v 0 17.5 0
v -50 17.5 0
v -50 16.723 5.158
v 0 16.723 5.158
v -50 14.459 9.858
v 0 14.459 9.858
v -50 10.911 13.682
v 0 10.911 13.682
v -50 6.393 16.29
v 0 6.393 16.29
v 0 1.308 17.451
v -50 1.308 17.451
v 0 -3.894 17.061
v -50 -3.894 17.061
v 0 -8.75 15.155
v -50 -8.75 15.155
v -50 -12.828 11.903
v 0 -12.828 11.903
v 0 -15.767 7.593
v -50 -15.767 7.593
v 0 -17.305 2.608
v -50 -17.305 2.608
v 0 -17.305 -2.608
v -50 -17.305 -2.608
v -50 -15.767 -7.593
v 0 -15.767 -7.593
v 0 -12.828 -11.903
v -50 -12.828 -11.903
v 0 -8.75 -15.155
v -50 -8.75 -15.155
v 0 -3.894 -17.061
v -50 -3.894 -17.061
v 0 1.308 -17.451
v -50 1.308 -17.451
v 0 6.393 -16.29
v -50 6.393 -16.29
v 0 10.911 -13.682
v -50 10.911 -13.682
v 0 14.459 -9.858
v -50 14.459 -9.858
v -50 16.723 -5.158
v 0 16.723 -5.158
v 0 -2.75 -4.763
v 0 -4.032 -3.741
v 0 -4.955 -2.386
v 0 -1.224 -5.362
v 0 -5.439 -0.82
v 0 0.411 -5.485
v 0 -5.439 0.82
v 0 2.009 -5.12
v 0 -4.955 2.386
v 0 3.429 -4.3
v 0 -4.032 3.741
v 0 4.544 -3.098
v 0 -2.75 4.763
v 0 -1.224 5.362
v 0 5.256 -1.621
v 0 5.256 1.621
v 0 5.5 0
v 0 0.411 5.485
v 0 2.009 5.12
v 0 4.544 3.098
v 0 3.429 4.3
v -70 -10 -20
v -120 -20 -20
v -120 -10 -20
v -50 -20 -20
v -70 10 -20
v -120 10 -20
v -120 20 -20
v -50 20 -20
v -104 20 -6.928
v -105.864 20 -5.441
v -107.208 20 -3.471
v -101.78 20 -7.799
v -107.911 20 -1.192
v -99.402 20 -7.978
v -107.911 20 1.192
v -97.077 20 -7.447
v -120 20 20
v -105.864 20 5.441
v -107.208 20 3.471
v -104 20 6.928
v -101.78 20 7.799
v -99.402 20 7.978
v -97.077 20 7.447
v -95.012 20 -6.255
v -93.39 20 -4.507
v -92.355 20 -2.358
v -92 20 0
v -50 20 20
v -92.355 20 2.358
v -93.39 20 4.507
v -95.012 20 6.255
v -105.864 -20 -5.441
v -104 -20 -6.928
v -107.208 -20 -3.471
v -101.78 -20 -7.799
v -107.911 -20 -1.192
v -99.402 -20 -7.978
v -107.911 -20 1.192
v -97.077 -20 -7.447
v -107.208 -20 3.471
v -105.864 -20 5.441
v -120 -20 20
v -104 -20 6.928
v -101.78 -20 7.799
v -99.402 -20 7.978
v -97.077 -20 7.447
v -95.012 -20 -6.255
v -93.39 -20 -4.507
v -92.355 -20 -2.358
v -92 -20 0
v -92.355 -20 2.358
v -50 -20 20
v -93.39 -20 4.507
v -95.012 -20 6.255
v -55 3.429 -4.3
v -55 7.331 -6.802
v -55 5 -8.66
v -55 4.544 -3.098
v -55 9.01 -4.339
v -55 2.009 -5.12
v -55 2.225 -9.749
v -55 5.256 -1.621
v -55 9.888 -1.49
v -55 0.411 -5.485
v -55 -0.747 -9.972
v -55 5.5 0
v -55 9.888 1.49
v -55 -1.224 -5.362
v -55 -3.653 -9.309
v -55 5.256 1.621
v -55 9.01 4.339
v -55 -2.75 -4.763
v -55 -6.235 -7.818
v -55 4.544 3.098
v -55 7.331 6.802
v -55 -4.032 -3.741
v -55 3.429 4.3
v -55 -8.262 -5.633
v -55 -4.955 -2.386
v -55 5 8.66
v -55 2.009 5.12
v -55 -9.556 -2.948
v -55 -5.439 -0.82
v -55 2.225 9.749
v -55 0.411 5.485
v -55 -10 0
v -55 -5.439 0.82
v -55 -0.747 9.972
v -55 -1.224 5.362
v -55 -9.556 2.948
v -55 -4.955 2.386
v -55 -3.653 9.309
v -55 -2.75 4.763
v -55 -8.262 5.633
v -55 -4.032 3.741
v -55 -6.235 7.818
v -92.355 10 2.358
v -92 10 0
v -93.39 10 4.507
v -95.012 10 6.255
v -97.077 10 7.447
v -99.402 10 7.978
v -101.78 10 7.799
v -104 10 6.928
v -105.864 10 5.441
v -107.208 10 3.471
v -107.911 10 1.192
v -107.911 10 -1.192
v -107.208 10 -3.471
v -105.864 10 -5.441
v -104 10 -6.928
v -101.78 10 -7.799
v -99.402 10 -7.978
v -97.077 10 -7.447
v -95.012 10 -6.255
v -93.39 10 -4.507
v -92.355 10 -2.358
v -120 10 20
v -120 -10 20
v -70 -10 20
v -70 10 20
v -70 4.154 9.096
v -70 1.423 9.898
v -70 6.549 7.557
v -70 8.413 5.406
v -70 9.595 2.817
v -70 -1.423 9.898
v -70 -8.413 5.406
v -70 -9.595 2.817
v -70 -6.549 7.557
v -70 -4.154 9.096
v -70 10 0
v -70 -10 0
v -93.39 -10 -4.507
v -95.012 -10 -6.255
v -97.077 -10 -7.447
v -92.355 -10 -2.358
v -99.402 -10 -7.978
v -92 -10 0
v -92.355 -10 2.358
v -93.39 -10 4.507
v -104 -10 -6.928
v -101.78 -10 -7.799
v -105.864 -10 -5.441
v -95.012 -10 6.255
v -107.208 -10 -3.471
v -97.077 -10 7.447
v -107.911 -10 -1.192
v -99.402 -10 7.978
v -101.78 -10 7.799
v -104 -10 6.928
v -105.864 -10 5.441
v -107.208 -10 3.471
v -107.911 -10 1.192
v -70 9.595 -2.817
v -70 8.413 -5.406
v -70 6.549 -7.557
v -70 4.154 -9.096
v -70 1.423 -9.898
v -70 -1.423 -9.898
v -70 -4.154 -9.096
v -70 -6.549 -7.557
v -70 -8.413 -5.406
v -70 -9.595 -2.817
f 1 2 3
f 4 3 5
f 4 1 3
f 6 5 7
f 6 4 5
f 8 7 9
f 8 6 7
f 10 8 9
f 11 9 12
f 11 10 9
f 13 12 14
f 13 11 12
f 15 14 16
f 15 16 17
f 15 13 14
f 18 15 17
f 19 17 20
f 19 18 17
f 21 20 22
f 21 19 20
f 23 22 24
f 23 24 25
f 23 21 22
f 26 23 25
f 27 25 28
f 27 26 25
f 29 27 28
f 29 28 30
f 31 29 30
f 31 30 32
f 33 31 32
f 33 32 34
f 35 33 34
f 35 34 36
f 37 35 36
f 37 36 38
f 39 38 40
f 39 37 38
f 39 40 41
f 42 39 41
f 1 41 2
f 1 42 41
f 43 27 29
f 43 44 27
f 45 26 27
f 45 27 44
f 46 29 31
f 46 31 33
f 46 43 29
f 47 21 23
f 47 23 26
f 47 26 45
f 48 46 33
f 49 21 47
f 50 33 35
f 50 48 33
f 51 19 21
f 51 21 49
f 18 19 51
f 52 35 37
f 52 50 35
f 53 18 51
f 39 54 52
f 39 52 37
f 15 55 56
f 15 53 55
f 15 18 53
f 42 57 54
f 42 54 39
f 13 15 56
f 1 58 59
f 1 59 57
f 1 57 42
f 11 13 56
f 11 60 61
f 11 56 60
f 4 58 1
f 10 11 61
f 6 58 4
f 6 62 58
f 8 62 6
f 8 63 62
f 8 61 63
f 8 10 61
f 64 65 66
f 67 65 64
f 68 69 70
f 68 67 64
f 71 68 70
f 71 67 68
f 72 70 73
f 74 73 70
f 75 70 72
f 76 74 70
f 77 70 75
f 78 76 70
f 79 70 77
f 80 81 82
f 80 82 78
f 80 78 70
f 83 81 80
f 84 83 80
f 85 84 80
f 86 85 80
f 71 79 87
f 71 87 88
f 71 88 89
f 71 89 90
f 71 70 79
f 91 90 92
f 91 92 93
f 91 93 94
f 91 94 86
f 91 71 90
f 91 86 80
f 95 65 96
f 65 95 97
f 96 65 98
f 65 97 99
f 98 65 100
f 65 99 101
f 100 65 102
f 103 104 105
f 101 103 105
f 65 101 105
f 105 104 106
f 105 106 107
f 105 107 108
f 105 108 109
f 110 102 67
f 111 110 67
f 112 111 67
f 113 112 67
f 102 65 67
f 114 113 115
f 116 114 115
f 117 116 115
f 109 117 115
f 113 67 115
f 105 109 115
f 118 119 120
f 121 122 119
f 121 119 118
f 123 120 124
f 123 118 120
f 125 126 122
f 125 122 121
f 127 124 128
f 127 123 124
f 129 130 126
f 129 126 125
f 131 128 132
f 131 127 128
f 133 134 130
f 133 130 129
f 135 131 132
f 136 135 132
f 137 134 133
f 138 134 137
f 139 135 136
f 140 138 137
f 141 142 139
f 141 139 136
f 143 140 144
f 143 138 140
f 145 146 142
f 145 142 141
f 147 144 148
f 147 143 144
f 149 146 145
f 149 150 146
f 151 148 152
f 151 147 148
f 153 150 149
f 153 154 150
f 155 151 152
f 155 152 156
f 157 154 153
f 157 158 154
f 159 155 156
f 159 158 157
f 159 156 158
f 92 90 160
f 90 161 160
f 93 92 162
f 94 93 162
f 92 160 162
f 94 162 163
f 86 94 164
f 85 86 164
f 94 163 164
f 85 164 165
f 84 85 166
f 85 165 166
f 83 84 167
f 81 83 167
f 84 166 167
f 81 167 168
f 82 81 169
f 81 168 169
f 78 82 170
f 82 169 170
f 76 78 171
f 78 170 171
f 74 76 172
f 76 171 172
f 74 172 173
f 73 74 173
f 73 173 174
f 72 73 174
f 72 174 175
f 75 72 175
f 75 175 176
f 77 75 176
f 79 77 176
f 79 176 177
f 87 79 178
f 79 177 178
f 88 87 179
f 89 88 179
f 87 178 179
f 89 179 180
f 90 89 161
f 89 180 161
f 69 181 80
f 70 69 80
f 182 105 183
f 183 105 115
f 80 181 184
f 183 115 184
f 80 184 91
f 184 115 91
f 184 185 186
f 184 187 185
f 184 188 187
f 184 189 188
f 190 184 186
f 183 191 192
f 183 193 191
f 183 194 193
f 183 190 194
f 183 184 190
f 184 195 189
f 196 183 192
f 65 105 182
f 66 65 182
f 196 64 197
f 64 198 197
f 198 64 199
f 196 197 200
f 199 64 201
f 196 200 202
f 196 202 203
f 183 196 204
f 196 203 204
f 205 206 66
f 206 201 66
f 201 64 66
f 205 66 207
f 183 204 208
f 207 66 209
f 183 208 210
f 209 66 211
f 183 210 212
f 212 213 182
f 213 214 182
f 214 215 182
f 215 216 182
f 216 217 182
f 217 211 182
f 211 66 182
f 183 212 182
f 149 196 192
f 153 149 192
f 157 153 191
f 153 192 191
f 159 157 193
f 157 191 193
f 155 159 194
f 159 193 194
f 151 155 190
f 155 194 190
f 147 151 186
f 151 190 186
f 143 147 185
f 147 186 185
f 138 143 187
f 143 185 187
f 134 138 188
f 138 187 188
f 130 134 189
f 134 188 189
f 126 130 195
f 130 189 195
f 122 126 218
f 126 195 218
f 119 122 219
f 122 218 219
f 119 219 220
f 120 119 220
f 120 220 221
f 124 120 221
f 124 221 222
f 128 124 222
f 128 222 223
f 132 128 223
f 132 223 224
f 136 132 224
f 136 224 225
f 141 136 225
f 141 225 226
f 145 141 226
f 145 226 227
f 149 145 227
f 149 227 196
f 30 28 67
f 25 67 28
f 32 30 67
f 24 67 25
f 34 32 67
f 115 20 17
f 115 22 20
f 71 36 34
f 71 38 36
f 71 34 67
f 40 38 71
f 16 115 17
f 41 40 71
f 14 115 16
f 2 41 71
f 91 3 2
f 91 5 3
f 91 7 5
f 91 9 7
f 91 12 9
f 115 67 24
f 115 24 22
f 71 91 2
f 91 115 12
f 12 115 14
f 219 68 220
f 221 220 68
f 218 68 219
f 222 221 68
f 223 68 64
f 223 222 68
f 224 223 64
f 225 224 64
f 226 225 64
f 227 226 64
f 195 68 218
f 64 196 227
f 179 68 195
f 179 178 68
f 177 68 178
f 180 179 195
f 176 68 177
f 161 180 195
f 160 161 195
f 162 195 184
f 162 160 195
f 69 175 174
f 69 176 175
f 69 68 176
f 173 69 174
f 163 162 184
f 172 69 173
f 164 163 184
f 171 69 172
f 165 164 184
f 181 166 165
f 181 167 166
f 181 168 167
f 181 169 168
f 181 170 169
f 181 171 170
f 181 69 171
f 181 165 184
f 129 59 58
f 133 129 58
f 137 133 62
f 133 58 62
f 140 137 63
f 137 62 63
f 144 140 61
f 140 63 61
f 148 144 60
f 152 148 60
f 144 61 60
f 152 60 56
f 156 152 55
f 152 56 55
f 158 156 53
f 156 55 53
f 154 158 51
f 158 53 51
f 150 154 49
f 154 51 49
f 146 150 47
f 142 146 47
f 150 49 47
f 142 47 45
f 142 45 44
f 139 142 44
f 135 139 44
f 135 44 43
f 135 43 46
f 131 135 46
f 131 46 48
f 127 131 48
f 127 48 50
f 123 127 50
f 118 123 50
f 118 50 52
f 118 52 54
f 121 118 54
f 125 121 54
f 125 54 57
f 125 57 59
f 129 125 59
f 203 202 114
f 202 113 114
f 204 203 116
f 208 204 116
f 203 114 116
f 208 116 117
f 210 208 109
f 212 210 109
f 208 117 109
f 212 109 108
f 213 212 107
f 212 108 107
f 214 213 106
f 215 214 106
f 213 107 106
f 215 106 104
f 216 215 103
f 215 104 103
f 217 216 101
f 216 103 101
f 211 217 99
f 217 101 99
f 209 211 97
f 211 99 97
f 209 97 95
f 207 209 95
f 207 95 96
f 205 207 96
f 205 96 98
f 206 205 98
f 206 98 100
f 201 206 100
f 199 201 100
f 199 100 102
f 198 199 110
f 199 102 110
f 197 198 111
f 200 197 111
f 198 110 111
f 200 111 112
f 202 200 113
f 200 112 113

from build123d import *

# Parameters (mm, degrees)
F0_W      = 40
F0_H      = 40
F1_DEPTH  = 120
F2_W      = 40
F2_H      = 40
F2_R      = 17.5
F3_DEPTH  = 50
F4_R      = 5.5
F5_DEPTH  = 100
F6_W      = 20
F6_H      = 40
F7_DEPTH  = 50
F8_R      = 10
F9_DEPTH  = 15
F10_R     = 8
F11_DEPTH = 60


with BuildPart() as f1:
    # F0 (on Right) → F1 (new body)
    with BuildSketch(Plane.YZ):
        Rectangle(F0_W, F0_H)
    extrude(amount=-F1_DEPTH)

    # F2 (on face) → F3 (cut)
    with BuildSketch(Plane.YZ):
        Rectangle(F2_W, F2_H)
        Circle(F2_R, mode=Mode.SUBTRACT)
    extrude(amount=-F3_DEPTH, mode=Mode.SUBTRACT)

    # F4 (on face) → F5 (cut)
    with BuildSketch(Plane.YZ):
        Circle(F4_R)
    extrude(amount=-F5_DEPTH, mode=Mode.SUBTRACT)

    # F6 (on face) → F7 (cut)
    with BuildSketch(Plane(origin=(-120, 0, 0), x_dir=(0, -1, 0), z_dir=(-1, 0, 0))):
        Rectangle(F6_W, F6_H)
    extrude(amount=-F7_DEPTH, mode=Mode.SUBTRACT)

    # F8 (on face) → F9 (cut)
    with BuildSketch(Plane(origin=(-70, 0, 0), x_dir=(0, -1, 0), z_dir=(-1, 0, 0))):
        Circle(F8_R)
    extrude(amount=-F9_DEPTH, mode=Mode.SUBTRACT)

    # F10 (on face) → F11 (cut, symmetric)
    with BuildSketch(Plane.XZ.offset(20)):
        with Locations((-100, 0)):
            Circle(F10_R)
    extrude(amount=F11_DEPTH, both=True, mode=Mode.SUBTRACT)


solid = f1.part
